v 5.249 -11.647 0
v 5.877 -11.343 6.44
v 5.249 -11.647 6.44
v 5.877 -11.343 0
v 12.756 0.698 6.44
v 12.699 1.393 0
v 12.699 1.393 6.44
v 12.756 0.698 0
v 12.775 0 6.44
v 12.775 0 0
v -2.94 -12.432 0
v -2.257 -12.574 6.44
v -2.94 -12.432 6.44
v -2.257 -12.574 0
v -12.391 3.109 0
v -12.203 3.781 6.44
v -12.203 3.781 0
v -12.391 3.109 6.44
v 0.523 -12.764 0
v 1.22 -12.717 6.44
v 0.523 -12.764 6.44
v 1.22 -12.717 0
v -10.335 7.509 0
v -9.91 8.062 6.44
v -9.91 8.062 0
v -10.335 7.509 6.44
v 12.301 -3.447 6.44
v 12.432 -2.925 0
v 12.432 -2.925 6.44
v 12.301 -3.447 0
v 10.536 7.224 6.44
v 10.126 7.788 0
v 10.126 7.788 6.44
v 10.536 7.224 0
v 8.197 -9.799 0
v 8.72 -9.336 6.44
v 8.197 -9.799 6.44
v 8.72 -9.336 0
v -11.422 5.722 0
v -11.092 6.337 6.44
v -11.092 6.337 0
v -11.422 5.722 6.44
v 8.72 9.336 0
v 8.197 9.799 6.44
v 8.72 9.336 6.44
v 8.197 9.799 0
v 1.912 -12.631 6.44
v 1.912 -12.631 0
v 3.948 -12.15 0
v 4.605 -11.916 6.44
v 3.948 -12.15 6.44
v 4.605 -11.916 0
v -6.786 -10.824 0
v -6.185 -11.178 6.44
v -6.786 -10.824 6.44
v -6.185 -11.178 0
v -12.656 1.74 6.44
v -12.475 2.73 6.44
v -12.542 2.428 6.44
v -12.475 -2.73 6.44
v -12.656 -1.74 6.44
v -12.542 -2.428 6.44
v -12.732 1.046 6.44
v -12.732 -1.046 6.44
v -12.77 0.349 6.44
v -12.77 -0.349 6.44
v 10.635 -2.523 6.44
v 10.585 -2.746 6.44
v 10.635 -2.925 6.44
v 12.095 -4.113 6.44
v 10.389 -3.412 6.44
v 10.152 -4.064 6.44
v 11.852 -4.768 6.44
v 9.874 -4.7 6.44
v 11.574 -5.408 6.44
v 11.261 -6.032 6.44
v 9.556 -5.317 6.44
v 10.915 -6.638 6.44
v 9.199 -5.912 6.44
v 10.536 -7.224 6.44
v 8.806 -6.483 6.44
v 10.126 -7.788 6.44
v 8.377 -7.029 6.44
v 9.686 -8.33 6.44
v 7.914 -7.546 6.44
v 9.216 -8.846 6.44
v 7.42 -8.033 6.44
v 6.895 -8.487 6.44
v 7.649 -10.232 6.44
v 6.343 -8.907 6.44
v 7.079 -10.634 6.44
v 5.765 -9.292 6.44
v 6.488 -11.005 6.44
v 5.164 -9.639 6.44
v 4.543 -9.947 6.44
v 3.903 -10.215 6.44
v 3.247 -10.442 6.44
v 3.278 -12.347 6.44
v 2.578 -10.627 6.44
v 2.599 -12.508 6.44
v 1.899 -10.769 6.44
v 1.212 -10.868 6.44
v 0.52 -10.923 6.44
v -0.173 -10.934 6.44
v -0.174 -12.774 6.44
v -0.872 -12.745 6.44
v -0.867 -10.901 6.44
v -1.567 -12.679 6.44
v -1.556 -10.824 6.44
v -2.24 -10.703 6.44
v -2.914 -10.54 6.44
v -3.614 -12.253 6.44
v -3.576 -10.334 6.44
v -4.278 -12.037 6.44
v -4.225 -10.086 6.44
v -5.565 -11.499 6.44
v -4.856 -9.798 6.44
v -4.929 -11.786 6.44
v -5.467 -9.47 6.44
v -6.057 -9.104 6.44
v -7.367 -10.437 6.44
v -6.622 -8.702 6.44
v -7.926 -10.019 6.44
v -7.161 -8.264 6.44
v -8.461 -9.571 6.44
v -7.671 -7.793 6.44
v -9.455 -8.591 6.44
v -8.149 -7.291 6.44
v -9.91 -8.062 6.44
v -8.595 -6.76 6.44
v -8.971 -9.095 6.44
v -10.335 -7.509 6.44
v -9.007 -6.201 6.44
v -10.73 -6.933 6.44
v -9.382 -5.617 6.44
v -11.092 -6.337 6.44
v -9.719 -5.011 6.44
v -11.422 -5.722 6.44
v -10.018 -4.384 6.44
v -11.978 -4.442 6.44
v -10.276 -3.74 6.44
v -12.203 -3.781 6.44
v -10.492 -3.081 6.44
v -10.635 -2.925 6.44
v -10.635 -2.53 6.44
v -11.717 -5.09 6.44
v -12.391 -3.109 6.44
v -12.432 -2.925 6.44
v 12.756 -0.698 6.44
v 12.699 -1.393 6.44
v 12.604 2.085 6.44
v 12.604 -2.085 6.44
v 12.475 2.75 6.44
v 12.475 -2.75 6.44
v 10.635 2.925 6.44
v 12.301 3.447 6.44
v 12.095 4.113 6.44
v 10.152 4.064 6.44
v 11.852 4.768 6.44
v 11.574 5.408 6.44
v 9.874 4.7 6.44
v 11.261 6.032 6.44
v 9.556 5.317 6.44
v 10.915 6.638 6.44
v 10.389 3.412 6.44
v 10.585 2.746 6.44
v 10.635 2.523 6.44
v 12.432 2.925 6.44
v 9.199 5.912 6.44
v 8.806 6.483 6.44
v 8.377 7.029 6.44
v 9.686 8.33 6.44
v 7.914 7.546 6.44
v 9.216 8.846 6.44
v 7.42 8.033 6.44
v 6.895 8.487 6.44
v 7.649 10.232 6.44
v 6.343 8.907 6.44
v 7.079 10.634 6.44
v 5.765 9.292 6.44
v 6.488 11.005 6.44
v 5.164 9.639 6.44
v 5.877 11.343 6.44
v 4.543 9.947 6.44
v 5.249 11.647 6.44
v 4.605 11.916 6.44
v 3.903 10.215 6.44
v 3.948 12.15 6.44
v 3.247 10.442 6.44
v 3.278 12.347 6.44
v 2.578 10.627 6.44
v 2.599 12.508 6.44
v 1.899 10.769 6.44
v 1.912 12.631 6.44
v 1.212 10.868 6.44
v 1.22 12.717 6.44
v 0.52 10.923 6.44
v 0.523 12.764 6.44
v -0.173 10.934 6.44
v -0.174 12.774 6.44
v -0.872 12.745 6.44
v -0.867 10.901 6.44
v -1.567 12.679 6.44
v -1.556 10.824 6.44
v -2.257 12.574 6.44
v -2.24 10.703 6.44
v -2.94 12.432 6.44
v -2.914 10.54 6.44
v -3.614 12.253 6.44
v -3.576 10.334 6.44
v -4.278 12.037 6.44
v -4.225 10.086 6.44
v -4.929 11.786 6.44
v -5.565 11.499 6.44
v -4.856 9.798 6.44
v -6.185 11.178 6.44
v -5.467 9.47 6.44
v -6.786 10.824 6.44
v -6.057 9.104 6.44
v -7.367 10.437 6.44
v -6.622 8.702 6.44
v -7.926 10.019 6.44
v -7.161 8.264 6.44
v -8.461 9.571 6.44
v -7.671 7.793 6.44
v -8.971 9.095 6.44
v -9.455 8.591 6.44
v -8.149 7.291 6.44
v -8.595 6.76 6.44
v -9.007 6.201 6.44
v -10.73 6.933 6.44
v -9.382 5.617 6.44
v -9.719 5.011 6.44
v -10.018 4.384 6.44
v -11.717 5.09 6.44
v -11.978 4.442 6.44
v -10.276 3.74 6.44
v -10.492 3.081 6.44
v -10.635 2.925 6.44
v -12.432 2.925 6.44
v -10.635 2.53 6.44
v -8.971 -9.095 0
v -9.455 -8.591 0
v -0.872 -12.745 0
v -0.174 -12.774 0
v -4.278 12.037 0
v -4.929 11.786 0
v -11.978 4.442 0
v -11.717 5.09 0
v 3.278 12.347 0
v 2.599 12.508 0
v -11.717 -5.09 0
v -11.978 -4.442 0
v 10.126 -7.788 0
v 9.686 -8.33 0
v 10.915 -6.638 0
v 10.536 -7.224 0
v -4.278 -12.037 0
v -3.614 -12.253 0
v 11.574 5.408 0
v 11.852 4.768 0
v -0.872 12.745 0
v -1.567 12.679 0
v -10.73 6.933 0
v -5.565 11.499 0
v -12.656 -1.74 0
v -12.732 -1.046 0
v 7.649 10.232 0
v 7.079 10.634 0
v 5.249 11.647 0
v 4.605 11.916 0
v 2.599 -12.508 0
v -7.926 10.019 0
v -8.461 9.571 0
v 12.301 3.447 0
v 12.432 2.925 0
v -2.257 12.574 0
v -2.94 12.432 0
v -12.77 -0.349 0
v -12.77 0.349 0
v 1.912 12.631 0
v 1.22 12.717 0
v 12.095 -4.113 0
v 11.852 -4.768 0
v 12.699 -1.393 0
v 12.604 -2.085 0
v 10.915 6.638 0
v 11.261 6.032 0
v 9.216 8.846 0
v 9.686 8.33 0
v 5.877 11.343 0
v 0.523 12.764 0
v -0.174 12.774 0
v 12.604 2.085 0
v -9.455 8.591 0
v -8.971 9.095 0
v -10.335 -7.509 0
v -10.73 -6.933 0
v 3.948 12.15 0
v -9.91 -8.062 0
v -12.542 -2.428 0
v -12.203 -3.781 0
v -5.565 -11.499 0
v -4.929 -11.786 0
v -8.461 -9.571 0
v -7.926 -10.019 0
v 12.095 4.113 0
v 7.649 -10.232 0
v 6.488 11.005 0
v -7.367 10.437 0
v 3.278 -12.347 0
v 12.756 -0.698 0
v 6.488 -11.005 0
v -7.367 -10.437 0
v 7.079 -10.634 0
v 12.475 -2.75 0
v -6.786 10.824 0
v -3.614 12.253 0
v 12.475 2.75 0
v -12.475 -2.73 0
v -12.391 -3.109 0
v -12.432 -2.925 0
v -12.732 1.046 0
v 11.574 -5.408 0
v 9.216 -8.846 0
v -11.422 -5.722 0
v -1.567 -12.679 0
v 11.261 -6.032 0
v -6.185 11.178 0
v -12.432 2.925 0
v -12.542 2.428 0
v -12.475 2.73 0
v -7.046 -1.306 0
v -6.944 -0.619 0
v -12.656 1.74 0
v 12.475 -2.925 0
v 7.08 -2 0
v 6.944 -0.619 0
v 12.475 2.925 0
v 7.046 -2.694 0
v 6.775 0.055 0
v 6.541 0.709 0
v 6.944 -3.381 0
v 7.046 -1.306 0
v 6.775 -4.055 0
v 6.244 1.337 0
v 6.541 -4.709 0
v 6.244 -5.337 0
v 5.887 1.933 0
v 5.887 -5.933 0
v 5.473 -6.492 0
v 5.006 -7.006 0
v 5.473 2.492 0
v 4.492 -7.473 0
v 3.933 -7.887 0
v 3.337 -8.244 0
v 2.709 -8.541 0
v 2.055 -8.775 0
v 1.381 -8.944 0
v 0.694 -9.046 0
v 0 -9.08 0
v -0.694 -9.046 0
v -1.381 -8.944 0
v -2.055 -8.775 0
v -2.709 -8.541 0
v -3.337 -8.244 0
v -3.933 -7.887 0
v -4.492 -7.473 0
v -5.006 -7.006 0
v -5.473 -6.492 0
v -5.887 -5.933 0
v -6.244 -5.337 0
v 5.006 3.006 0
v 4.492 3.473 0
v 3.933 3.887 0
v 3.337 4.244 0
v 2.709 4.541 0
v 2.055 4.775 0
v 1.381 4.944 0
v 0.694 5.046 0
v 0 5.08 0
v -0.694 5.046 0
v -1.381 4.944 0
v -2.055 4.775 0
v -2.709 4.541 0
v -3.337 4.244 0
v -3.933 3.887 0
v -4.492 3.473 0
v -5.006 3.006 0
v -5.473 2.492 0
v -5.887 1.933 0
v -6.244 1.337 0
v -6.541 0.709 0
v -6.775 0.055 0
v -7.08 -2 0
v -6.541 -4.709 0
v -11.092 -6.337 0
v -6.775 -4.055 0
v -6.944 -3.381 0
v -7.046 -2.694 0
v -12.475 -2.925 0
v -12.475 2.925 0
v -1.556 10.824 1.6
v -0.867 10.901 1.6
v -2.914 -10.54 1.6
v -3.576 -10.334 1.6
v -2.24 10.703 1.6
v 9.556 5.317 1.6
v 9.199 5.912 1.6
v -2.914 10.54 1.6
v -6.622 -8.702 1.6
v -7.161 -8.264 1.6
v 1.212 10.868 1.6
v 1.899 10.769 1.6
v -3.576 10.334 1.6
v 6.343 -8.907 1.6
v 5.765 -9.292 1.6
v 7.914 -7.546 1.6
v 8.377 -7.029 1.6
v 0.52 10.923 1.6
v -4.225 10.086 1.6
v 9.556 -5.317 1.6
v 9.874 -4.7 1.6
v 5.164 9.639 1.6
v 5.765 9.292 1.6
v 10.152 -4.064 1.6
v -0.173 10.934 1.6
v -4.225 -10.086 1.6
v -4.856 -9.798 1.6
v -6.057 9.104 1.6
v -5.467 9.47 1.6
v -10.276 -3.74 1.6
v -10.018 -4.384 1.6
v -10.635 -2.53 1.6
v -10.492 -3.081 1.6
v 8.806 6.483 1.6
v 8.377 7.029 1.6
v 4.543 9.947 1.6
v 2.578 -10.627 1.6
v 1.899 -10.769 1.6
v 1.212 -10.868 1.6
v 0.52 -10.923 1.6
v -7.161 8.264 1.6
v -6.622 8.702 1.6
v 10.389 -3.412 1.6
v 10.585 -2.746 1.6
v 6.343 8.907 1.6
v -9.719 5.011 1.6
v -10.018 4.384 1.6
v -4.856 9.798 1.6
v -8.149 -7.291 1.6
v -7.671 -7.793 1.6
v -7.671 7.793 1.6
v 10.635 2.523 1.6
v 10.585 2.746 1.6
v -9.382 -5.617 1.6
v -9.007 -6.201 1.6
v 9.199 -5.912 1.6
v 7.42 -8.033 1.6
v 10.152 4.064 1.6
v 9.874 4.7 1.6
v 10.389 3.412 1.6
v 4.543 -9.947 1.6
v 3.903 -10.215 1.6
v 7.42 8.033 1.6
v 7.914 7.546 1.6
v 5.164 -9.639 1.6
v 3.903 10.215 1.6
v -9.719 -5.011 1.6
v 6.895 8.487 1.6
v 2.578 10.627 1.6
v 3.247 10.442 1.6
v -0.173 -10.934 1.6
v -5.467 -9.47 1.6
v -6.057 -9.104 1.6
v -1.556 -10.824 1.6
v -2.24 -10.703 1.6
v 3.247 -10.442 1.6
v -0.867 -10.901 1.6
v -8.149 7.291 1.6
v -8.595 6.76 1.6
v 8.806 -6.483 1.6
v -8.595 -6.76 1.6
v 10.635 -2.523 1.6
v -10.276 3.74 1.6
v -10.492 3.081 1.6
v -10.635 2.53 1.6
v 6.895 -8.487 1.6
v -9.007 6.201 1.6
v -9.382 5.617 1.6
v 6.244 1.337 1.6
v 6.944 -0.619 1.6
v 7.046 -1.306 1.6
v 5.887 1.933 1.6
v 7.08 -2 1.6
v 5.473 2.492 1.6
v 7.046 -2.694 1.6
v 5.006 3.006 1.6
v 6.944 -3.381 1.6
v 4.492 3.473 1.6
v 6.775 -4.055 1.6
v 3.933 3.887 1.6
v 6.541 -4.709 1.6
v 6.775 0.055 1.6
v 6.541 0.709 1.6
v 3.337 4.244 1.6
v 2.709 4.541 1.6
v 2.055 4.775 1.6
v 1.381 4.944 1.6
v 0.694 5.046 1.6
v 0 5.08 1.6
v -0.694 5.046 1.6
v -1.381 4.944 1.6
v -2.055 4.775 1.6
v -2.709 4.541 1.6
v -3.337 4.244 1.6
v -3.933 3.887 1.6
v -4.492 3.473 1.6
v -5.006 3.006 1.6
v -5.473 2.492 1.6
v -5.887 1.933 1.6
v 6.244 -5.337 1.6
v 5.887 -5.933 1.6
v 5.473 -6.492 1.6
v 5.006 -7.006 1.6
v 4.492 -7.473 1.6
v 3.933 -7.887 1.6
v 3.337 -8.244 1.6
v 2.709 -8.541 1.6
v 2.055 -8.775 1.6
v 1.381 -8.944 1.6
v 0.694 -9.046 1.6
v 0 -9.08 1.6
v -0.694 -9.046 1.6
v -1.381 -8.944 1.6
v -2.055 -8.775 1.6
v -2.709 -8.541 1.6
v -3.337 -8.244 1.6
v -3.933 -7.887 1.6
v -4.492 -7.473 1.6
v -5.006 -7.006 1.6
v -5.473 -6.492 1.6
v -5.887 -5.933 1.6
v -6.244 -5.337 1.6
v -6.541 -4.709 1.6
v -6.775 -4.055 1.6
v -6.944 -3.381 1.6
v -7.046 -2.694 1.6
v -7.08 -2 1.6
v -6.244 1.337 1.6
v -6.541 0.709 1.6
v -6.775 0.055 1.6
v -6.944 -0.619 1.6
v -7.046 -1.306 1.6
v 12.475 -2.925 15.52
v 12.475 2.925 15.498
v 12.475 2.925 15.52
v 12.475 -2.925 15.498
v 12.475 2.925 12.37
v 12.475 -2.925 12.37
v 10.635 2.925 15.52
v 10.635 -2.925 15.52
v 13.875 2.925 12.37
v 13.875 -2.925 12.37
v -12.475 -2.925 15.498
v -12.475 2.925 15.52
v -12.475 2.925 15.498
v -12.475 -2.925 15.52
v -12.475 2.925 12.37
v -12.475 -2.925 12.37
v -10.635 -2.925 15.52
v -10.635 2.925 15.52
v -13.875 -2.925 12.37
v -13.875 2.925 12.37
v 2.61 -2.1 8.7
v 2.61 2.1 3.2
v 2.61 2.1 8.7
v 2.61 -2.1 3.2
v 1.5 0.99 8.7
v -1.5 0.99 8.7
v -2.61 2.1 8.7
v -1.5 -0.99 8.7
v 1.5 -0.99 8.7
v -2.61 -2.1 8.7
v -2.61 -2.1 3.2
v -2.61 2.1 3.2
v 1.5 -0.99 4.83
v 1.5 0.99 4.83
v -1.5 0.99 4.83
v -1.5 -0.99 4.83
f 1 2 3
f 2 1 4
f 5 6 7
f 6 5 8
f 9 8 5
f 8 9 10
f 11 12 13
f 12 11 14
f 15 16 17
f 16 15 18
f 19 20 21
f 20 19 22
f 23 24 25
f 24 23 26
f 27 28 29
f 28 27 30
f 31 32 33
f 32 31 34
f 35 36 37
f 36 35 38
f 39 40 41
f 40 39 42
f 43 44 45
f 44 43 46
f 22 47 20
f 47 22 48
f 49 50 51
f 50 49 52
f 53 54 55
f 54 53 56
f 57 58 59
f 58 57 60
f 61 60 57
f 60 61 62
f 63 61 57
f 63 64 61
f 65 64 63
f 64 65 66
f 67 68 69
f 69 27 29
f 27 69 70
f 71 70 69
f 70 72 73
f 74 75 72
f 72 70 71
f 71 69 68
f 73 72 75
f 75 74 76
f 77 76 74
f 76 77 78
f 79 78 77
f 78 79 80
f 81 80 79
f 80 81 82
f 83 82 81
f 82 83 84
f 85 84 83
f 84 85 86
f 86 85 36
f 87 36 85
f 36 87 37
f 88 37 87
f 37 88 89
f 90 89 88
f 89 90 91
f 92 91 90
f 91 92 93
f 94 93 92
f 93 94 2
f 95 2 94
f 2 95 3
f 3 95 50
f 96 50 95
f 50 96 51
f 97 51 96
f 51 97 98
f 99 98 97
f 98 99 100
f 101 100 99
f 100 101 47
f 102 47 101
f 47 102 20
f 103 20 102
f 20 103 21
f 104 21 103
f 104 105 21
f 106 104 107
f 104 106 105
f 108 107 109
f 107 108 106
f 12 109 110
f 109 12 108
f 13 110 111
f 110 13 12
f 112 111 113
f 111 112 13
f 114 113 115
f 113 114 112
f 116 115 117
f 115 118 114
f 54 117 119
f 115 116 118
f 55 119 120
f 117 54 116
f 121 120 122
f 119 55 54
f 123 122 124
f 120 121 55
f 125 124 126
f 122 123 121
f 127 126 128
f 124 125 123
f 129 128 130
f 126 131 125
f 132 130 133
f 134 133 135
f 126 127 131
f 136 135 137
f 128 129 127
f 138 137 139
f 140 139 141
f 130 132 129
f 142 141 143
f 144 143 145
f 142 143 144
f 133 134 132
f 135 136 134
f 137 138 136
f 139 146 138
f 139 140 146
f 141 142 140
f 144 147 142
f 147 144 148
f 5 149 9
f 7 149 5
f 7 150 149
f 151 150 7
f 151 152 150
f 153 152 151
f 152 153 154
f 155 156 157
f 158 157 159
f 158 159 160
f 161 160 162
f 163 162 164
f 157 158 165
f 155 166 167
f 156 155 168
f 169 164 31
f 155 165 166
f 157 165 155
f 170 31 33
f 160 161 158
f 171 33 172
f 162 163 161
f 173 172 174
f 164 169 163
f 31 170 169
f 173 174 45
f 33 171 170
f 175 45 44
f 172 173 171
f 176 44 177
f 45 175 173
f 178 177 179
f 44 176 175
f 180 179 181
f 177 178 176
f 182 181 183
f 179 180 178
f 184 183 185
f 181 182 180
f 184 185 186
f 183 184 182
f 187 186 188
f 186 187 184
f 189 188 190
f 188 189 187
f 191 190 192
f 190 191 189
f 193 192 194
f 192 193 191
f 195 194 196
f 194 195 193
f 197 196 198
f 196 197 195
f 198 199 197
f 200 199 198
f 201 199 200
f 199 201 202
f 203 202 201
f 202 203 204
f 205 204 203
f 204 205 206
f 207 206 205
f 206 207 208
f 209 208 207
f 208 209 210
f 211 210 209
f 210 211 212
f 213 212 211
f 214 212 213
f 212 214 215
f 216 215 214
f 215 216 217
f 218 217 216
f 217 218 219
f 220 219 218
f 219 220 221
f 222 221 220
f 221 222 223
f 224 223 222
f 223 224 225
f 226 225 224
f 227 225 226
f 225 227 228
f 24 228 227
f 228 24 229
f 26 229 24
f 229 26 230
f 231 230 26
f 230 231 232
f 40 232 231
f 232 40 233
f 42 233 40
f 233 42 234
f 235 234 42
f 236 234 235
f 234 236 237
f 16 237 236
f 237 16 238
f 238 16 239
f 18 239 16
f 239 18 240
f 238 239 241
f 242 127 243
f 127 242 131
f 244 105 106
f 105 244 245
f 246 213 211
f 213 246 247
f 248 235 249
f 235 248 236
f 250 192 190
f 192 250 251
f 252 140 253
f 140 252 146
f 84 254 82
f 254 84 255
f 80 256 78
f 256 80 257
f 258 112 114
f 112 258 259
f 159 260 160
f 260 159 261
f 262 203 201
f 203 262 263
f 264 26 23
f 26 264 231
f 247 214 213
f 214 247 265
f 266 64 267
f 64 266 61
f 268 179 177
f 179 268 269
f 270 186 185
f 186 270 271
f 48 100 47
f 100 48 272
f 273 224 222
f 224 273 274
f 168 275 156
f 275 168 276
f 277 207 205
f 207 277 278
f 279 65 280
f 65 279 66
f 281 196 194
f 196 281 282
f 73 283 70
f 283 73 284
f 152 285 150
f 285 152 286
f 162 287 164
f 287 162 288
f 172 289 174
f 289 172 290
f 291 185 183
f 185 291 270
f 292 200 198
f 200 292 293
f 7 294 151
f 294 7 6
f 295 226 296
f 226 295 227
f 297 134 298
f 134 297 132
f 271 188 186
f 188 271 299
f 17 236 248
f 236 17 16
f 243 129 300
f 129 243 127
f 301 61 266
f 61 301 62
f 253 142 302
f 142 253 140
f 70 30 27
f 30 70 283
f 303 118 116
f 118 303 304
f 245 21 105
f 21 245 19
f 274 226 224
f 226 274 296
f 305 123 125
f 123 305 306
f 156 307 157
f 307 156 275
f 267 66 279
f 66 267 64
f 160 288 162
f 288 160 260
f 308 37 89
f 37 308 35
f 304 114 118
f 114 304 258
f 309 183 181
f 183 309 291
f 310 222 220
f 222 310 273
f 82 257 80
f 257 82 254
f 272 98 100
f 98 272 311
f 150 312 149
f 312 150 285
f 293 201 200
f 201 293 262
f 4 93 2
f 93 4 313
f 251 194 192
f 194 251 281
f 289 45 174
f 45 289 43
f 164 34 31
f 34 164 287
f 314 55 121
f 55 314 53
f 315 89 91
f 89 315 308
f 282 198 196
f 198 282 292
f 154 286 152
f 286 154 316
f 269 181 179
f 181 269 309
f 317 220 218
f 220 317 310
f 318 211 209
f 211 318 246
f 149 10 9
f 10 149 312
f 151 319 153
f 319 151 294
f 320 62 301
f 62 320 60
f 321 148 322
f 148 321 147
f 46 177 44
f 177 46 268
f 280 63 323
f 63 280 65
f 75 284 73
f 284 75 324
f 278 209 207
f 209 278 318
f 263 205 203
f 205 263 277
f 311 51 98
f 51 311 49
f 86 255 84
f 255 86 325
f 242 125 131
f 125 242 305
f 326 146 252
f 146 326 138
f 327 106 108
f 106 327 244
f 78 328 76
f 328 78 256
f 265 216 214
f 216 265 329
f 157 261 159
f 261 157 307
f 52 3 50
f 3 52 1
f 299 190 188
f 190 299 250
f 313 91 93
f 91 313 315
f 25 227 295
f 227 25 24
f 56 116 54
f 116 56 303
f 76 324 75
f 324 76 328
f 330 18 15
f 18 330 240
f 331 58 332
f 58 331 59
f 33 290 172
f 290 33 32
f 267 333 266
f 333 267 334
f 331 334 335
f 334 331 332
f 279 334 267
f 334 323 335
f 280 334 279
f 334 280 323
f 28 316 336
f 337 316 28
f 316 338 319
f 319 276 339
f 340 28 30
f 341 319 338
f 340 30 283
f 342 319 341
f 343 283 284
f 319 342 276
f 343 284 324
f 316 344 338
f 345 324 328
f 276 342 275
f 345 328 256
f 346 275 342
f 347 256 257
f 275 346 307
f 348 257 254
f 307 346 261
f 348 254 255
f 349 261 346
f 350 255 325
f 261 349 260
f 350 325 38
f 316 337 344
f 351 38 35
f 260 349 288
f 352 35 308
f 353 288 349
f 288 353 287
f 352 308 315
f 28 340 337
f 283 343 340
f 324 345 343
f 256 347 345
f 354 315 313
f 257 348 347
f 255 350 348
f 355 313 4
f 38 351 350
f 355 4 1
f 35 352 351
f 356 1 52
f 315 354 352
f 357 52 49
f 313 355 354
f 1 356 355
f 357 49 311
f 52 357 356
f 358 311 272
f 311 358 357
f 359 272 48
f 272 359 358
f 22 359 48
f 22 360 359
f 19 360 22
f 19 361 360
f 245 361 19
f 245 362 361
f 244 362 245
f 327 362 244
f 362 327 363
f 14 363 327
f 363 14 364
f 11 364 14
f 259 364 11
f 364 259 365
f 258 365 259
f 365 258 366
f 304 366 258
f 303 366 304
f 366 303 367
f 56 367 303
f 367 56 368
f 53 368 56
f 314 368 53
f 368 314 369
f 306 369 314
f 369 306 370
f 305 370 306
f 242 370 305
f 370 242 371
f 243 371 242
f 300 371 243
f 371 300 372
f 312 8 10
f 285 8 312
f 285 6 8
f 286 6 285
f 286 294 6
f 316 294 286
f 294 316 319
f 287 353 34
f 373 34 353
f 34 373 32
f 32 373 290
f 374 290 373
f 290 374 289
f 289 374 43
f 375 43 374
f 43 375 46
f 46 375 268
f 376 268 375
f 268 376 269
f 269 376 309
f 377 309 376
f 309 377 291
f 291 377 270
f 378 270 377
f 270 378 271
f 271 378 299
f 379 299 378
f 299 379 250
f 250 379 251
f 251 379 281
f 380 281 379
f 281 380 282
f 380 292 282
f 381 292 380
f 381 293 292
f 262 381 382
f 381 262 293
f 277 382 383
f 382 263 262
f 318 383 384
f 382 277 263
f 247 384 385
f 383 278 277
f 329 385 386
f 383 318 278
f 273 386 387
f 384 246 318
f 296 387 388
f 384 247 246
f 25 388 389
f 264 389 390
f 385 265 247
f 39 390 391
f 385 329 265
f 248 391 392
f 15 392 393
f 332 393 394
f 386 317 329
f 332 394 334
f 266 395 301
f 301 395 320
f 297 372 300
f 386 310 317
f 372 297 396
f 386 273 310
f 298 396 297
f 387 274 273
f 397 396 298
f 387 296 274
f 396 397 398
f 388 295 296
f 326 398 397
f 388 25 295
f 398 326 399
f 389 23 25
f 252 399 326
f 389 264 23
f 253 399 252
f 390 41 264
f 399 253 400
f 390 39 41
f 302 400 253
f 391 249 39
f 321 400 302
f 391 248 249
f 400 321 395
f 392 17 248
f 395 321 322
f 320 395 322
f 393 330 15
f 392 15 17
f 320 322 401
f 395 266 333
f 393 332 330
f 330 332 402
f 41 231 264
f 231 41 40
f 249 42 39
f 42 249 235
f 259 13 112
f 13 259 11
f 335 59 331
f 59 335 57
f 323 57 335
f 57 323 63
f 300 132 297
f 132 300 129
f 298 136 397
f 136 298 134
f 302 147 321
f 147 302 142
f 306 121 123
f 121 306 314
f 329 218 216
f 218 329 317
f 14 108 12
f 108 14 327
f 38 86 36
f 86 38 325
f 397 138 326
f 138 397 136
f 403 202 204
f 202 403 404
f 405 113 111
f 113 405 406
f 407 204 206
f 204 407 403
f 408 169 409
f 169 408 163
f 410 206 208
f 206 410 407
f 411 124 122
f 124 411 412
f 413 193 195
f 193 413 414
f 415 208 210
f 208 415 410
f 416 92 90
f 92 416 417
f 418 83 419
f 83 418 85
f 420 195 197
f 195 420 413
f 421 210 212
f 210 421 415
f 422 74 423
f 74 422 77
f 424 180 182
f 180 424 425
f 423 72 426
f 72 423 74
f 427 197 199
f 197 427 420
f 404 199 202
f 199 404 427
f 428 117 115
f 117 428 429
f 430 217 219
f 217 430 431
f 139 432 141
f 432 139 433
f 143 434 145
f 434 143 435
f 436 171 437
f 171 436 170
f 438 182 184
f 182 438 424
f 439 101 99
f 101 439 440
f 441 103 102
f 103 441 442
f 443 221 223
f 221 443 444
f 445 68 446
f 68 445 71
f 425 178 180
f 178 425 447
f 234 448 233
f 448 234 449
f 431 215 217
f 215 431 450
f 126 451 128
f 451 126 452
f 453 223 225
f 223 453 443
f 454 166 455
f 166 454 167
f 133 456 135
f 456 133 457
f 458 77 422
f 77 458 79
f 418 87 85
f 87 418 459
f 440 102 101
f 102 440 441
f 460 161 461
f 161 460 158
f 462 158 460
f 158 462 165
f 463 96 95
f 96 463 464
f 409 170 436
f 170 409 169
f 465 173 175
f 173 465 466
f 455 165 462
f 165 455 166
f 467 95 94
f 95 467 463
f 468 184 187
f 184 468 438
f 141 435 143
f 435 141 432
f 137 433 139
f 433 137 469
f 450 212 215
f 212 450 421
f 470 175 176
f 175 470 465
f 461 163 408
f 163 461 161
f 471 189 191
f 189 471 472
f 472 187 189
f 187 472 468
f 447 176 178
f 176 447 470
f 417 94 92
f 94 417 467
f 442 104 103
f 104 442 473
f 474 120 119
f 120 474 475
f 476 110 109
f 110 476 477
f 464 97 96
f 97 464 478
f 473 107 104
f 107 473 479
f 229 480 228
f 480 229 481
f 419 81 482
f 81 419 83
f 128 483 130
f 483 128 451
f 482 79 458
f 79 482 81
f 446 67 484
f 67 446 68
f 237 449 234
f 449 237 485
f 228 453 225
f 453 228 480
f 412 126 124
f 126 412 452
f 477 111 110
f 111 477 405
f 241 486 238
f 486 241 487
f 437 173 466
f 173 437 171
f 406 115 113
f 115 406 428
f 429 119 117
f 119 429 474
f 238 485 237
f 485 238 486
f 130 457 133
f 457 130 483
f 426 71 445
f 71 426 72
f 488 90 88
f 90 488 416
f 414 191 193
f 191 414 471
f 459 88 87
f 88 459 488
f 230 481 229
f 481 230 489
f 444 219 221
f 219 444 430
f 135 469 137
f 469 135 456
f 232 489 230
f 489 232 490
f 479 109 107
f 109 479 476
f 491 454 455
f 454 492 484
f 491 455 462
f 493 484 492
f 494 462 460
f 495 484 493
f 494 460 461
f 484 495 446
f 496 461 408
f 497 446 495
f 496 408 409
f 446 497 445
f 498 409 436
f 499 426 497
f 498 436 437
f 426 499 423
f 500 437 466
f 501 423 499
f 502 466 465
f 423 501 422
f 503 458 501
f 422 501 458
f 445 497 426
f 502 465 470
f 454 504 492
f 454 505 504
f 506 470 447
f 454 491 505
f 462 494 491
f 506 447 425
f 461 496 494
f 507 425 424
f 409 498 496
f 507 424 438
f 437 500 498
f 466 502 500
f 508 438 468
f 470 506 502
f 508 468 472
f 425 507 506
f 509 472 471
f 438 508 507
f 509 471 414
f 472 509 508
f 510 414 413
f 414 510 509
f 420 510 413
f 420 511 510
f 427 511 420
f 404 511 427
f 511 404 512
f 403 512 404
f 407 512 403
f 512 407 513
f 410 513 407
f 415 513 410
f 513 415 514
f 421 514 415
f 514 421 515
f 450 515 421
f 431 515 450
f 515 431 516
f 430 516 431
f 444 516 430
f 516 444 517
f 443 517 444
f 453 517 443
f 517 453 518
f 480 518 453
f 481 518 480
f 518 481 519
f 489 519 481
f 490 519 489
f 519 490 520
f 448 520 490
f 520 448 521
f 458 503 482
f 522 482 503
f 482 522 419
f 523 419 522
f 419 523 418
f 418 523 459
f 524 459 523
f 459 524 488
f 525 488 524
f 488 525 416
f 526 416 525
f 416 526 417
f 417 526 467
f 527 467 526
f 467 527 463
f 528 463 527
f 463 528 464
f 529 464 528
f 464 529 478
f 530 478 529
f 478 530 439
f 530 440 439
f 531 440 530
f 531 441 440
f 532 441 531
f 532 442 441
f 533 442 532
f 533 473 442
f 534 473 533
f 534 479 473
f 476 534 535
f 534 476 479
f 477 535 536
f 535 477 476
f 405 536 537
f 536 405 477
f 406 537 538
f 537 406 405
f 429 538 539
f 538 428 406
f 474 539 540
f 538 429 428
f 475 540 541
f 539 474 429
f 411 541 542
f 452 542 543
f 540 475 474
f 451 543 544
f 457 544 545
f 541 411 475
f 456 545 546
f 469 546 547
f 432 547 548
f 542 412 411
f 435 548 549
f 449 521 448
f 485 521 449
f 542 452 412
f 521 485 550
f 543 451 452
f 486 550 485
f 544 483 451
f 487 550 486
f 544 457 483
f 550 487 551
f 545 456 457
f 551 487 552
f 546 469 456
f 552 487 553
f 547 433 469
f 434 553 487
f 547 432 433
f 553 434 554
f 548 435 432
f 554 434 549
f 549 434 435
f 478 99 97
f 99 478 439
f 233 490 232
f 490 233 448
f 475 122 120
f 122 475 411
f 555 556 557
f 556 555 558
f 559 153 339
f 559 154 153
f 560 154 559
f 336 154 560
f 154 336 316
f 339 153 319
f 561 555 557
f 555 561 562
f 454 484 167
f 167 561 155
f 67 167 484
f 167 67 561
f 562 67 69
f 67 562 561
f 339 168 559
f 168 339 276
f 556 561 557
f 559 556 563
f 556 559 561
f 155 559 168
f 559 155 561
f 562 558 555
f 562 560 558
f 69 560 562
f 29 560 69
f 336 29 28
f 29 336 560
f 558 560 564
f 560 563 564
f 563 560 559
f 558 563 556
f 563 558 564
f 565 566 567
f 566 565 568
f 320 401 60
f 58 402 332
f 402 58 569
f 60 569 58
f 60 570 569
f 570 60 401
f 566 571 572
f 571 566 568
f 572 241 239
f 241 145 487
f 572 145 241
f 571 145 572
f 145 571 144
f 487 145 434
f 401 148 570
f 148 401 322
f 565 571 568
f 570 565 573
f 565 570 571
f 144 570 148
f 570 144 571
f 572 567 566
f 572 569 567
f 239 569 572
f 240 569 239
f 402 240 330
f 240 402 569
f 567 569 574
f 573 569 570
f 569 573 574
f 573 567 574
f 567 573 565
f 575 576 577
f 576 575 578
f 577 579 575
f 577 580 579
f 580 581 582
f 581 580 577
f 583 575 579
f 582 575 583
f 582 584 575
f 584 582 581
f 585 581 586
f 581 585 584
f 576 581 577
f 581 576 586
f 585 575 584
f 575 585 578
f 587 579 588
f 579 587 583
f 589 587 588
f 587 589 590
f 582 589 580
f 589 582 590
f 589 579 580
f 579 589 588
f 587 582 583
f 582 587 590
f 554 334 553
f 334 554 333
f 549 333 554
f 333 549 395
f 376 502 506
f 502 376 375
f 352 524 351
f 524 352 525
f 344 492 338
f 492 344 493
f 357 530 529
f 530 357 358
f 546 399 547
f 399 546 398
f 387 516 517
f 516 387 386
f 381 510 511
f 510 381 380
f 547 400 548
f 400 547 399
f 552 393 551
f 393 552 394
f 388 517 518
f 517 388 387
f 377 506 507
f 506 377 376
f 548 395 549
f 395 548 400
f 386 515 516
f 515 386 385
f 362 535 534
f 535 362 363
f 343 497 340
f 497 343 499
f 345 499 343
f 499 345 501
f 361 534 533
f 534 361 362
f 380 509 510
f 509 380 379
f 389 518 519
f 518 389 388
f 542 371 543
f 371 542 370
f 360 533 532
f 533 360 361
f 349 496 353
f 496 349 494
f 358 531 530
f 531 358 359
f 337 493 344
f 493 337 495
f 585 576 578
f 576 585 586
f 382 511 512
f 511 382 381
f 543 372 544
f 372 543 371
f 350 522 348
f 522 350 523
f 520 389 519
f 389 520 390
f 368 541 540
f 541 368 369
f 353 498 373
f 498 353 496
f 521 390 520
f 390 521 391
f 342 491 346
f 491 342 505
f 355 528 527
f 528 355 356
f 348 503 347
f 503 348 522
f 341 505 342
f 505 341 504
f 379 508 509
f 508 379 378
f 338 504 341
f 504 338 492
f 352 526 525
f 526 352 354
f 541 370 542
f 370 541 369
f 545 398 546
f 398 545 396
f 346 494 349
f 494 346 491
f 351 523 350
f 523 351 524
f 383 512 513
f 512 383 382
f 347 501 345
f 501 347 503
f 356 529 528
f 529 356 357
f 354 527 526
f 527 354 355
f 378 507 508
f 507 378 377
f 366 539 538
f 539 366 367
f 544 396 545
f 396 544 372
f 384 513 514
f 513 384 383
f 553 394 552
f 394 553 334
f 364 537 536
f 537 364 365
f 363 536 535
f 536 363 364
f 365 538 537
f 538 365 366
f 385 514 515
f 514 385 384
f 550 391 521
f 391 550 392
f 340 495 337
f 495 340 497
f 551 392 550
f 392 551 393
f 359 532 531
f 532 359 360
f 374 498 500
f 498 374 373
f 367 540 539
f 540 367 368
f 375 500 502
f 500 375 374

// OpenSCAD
$fa=1;
$fs=.7;

button_outer_diameter = 25.55;
button_outer_r = button_outer_diameter / 2;
button_wall_height = 6.44;
button_wall_thickness = 1.84;
button_face_thickness = 1.6;

button_prong_height = 15.52; // from face of button
button_prong_width = 5.85;
button_prong_thickness = button_wall_thickness;

button_clip_overhang = 1.4;
button_clip_height = 3.15;

button_plunger_height = 8.7;
button_plunger_thickness=5.22;  //same access as prong thickness
button_plunger_width=4.2;
plunger_hollow_thickness=3;
plunger_hollow_width=1.98;
plunger_hollow_depth=3.88;

cutout_height=1;

color("blue")

difference(){
button();

//fb_side=24;
//translate([-fb_side/2,-fb_side/2,0])
//cube([fb_side,fb_side,4]);

translate([0,-2,button_face_thickness*2])
resize([0,0,button_face_thickness*4])
dva_cutout();
}

module dva_cutout(){
difference() {
color("pink")

rotate(a=180, v=[0,1,0])
dva_backdrop();

color("white")
rotate(a=180, v=[0,1,0])
resize([button_outer_r, button_outer_r, 2])
dva_logo();
}
}

module button(){
difference(){
  cylinder(h=button_wall_height, r=button_outer_r);
  //hollow out the button bottom
  translate([0,0,button_face_thickness]) // raise it to allow the face
    cylinder(h=button_wall_height, r=button_outer_r-(button_wall_thickness));
}

prong_offset_x = button_outer_r - button_prong_thickness - 0.3;
prong_offset_y = button_prong_width / 2;

translate([prong_offset_x, -prong_offset_y, 0])
prong();

translate([-prong_offset_x, prong_offset_y, 0])
rotate(a=180, v=[0,0,1])
prong();

//plunger
difference(){
translate([-button_plunger_thickness/2, -button_plunger_width/2, 0])
cube([button_plunger_thickness, button_plunger_width, button_plunger_height]);
//hollow
translate([-plunger_hollow_thickness/2, -plunger_hollow_width/2, button_plunger_height-plunger_hollow_depth+0.01])
cube([plunger_hollow_thickness, plunger_hollow_width, plunger_hollow_depth]);
}



}

module prong(){
  cube([button_prong_thickness, button_prong_width, button_prong_height]);
  
  clip_x = button_clip_overhang;
  clip_y = button_clip_height;
  clip_inset = 0.01; //to make sure the surfaces join
  
  translate([button_prong_thickness-clip_inset, button_prong_width, button_prong_height - button_clip_height])
  rotate(a=90, v=[1,0,0])
  linear_extrude(height=button_prong_width)
  polygon(points=[ [0, 0], [clip_x + clip_inset, 0], [0, clip_y] ]);
}

module dva_backdrop(){
  linear_extrude(height=cutout_height)
  circle(r=7.08);
}

module dva_logo() {
logo_path = "/Users/josh/Downloads/dva_logo_white_on_black.png";

translate([0,0,-0.5])
  difference(){
    resize(newsize=[0,0,3])
      surface(file=logo_path, center=true);

    translate([0, 0, -0.5])
      cube([200,200,1], center=true);
}
}
